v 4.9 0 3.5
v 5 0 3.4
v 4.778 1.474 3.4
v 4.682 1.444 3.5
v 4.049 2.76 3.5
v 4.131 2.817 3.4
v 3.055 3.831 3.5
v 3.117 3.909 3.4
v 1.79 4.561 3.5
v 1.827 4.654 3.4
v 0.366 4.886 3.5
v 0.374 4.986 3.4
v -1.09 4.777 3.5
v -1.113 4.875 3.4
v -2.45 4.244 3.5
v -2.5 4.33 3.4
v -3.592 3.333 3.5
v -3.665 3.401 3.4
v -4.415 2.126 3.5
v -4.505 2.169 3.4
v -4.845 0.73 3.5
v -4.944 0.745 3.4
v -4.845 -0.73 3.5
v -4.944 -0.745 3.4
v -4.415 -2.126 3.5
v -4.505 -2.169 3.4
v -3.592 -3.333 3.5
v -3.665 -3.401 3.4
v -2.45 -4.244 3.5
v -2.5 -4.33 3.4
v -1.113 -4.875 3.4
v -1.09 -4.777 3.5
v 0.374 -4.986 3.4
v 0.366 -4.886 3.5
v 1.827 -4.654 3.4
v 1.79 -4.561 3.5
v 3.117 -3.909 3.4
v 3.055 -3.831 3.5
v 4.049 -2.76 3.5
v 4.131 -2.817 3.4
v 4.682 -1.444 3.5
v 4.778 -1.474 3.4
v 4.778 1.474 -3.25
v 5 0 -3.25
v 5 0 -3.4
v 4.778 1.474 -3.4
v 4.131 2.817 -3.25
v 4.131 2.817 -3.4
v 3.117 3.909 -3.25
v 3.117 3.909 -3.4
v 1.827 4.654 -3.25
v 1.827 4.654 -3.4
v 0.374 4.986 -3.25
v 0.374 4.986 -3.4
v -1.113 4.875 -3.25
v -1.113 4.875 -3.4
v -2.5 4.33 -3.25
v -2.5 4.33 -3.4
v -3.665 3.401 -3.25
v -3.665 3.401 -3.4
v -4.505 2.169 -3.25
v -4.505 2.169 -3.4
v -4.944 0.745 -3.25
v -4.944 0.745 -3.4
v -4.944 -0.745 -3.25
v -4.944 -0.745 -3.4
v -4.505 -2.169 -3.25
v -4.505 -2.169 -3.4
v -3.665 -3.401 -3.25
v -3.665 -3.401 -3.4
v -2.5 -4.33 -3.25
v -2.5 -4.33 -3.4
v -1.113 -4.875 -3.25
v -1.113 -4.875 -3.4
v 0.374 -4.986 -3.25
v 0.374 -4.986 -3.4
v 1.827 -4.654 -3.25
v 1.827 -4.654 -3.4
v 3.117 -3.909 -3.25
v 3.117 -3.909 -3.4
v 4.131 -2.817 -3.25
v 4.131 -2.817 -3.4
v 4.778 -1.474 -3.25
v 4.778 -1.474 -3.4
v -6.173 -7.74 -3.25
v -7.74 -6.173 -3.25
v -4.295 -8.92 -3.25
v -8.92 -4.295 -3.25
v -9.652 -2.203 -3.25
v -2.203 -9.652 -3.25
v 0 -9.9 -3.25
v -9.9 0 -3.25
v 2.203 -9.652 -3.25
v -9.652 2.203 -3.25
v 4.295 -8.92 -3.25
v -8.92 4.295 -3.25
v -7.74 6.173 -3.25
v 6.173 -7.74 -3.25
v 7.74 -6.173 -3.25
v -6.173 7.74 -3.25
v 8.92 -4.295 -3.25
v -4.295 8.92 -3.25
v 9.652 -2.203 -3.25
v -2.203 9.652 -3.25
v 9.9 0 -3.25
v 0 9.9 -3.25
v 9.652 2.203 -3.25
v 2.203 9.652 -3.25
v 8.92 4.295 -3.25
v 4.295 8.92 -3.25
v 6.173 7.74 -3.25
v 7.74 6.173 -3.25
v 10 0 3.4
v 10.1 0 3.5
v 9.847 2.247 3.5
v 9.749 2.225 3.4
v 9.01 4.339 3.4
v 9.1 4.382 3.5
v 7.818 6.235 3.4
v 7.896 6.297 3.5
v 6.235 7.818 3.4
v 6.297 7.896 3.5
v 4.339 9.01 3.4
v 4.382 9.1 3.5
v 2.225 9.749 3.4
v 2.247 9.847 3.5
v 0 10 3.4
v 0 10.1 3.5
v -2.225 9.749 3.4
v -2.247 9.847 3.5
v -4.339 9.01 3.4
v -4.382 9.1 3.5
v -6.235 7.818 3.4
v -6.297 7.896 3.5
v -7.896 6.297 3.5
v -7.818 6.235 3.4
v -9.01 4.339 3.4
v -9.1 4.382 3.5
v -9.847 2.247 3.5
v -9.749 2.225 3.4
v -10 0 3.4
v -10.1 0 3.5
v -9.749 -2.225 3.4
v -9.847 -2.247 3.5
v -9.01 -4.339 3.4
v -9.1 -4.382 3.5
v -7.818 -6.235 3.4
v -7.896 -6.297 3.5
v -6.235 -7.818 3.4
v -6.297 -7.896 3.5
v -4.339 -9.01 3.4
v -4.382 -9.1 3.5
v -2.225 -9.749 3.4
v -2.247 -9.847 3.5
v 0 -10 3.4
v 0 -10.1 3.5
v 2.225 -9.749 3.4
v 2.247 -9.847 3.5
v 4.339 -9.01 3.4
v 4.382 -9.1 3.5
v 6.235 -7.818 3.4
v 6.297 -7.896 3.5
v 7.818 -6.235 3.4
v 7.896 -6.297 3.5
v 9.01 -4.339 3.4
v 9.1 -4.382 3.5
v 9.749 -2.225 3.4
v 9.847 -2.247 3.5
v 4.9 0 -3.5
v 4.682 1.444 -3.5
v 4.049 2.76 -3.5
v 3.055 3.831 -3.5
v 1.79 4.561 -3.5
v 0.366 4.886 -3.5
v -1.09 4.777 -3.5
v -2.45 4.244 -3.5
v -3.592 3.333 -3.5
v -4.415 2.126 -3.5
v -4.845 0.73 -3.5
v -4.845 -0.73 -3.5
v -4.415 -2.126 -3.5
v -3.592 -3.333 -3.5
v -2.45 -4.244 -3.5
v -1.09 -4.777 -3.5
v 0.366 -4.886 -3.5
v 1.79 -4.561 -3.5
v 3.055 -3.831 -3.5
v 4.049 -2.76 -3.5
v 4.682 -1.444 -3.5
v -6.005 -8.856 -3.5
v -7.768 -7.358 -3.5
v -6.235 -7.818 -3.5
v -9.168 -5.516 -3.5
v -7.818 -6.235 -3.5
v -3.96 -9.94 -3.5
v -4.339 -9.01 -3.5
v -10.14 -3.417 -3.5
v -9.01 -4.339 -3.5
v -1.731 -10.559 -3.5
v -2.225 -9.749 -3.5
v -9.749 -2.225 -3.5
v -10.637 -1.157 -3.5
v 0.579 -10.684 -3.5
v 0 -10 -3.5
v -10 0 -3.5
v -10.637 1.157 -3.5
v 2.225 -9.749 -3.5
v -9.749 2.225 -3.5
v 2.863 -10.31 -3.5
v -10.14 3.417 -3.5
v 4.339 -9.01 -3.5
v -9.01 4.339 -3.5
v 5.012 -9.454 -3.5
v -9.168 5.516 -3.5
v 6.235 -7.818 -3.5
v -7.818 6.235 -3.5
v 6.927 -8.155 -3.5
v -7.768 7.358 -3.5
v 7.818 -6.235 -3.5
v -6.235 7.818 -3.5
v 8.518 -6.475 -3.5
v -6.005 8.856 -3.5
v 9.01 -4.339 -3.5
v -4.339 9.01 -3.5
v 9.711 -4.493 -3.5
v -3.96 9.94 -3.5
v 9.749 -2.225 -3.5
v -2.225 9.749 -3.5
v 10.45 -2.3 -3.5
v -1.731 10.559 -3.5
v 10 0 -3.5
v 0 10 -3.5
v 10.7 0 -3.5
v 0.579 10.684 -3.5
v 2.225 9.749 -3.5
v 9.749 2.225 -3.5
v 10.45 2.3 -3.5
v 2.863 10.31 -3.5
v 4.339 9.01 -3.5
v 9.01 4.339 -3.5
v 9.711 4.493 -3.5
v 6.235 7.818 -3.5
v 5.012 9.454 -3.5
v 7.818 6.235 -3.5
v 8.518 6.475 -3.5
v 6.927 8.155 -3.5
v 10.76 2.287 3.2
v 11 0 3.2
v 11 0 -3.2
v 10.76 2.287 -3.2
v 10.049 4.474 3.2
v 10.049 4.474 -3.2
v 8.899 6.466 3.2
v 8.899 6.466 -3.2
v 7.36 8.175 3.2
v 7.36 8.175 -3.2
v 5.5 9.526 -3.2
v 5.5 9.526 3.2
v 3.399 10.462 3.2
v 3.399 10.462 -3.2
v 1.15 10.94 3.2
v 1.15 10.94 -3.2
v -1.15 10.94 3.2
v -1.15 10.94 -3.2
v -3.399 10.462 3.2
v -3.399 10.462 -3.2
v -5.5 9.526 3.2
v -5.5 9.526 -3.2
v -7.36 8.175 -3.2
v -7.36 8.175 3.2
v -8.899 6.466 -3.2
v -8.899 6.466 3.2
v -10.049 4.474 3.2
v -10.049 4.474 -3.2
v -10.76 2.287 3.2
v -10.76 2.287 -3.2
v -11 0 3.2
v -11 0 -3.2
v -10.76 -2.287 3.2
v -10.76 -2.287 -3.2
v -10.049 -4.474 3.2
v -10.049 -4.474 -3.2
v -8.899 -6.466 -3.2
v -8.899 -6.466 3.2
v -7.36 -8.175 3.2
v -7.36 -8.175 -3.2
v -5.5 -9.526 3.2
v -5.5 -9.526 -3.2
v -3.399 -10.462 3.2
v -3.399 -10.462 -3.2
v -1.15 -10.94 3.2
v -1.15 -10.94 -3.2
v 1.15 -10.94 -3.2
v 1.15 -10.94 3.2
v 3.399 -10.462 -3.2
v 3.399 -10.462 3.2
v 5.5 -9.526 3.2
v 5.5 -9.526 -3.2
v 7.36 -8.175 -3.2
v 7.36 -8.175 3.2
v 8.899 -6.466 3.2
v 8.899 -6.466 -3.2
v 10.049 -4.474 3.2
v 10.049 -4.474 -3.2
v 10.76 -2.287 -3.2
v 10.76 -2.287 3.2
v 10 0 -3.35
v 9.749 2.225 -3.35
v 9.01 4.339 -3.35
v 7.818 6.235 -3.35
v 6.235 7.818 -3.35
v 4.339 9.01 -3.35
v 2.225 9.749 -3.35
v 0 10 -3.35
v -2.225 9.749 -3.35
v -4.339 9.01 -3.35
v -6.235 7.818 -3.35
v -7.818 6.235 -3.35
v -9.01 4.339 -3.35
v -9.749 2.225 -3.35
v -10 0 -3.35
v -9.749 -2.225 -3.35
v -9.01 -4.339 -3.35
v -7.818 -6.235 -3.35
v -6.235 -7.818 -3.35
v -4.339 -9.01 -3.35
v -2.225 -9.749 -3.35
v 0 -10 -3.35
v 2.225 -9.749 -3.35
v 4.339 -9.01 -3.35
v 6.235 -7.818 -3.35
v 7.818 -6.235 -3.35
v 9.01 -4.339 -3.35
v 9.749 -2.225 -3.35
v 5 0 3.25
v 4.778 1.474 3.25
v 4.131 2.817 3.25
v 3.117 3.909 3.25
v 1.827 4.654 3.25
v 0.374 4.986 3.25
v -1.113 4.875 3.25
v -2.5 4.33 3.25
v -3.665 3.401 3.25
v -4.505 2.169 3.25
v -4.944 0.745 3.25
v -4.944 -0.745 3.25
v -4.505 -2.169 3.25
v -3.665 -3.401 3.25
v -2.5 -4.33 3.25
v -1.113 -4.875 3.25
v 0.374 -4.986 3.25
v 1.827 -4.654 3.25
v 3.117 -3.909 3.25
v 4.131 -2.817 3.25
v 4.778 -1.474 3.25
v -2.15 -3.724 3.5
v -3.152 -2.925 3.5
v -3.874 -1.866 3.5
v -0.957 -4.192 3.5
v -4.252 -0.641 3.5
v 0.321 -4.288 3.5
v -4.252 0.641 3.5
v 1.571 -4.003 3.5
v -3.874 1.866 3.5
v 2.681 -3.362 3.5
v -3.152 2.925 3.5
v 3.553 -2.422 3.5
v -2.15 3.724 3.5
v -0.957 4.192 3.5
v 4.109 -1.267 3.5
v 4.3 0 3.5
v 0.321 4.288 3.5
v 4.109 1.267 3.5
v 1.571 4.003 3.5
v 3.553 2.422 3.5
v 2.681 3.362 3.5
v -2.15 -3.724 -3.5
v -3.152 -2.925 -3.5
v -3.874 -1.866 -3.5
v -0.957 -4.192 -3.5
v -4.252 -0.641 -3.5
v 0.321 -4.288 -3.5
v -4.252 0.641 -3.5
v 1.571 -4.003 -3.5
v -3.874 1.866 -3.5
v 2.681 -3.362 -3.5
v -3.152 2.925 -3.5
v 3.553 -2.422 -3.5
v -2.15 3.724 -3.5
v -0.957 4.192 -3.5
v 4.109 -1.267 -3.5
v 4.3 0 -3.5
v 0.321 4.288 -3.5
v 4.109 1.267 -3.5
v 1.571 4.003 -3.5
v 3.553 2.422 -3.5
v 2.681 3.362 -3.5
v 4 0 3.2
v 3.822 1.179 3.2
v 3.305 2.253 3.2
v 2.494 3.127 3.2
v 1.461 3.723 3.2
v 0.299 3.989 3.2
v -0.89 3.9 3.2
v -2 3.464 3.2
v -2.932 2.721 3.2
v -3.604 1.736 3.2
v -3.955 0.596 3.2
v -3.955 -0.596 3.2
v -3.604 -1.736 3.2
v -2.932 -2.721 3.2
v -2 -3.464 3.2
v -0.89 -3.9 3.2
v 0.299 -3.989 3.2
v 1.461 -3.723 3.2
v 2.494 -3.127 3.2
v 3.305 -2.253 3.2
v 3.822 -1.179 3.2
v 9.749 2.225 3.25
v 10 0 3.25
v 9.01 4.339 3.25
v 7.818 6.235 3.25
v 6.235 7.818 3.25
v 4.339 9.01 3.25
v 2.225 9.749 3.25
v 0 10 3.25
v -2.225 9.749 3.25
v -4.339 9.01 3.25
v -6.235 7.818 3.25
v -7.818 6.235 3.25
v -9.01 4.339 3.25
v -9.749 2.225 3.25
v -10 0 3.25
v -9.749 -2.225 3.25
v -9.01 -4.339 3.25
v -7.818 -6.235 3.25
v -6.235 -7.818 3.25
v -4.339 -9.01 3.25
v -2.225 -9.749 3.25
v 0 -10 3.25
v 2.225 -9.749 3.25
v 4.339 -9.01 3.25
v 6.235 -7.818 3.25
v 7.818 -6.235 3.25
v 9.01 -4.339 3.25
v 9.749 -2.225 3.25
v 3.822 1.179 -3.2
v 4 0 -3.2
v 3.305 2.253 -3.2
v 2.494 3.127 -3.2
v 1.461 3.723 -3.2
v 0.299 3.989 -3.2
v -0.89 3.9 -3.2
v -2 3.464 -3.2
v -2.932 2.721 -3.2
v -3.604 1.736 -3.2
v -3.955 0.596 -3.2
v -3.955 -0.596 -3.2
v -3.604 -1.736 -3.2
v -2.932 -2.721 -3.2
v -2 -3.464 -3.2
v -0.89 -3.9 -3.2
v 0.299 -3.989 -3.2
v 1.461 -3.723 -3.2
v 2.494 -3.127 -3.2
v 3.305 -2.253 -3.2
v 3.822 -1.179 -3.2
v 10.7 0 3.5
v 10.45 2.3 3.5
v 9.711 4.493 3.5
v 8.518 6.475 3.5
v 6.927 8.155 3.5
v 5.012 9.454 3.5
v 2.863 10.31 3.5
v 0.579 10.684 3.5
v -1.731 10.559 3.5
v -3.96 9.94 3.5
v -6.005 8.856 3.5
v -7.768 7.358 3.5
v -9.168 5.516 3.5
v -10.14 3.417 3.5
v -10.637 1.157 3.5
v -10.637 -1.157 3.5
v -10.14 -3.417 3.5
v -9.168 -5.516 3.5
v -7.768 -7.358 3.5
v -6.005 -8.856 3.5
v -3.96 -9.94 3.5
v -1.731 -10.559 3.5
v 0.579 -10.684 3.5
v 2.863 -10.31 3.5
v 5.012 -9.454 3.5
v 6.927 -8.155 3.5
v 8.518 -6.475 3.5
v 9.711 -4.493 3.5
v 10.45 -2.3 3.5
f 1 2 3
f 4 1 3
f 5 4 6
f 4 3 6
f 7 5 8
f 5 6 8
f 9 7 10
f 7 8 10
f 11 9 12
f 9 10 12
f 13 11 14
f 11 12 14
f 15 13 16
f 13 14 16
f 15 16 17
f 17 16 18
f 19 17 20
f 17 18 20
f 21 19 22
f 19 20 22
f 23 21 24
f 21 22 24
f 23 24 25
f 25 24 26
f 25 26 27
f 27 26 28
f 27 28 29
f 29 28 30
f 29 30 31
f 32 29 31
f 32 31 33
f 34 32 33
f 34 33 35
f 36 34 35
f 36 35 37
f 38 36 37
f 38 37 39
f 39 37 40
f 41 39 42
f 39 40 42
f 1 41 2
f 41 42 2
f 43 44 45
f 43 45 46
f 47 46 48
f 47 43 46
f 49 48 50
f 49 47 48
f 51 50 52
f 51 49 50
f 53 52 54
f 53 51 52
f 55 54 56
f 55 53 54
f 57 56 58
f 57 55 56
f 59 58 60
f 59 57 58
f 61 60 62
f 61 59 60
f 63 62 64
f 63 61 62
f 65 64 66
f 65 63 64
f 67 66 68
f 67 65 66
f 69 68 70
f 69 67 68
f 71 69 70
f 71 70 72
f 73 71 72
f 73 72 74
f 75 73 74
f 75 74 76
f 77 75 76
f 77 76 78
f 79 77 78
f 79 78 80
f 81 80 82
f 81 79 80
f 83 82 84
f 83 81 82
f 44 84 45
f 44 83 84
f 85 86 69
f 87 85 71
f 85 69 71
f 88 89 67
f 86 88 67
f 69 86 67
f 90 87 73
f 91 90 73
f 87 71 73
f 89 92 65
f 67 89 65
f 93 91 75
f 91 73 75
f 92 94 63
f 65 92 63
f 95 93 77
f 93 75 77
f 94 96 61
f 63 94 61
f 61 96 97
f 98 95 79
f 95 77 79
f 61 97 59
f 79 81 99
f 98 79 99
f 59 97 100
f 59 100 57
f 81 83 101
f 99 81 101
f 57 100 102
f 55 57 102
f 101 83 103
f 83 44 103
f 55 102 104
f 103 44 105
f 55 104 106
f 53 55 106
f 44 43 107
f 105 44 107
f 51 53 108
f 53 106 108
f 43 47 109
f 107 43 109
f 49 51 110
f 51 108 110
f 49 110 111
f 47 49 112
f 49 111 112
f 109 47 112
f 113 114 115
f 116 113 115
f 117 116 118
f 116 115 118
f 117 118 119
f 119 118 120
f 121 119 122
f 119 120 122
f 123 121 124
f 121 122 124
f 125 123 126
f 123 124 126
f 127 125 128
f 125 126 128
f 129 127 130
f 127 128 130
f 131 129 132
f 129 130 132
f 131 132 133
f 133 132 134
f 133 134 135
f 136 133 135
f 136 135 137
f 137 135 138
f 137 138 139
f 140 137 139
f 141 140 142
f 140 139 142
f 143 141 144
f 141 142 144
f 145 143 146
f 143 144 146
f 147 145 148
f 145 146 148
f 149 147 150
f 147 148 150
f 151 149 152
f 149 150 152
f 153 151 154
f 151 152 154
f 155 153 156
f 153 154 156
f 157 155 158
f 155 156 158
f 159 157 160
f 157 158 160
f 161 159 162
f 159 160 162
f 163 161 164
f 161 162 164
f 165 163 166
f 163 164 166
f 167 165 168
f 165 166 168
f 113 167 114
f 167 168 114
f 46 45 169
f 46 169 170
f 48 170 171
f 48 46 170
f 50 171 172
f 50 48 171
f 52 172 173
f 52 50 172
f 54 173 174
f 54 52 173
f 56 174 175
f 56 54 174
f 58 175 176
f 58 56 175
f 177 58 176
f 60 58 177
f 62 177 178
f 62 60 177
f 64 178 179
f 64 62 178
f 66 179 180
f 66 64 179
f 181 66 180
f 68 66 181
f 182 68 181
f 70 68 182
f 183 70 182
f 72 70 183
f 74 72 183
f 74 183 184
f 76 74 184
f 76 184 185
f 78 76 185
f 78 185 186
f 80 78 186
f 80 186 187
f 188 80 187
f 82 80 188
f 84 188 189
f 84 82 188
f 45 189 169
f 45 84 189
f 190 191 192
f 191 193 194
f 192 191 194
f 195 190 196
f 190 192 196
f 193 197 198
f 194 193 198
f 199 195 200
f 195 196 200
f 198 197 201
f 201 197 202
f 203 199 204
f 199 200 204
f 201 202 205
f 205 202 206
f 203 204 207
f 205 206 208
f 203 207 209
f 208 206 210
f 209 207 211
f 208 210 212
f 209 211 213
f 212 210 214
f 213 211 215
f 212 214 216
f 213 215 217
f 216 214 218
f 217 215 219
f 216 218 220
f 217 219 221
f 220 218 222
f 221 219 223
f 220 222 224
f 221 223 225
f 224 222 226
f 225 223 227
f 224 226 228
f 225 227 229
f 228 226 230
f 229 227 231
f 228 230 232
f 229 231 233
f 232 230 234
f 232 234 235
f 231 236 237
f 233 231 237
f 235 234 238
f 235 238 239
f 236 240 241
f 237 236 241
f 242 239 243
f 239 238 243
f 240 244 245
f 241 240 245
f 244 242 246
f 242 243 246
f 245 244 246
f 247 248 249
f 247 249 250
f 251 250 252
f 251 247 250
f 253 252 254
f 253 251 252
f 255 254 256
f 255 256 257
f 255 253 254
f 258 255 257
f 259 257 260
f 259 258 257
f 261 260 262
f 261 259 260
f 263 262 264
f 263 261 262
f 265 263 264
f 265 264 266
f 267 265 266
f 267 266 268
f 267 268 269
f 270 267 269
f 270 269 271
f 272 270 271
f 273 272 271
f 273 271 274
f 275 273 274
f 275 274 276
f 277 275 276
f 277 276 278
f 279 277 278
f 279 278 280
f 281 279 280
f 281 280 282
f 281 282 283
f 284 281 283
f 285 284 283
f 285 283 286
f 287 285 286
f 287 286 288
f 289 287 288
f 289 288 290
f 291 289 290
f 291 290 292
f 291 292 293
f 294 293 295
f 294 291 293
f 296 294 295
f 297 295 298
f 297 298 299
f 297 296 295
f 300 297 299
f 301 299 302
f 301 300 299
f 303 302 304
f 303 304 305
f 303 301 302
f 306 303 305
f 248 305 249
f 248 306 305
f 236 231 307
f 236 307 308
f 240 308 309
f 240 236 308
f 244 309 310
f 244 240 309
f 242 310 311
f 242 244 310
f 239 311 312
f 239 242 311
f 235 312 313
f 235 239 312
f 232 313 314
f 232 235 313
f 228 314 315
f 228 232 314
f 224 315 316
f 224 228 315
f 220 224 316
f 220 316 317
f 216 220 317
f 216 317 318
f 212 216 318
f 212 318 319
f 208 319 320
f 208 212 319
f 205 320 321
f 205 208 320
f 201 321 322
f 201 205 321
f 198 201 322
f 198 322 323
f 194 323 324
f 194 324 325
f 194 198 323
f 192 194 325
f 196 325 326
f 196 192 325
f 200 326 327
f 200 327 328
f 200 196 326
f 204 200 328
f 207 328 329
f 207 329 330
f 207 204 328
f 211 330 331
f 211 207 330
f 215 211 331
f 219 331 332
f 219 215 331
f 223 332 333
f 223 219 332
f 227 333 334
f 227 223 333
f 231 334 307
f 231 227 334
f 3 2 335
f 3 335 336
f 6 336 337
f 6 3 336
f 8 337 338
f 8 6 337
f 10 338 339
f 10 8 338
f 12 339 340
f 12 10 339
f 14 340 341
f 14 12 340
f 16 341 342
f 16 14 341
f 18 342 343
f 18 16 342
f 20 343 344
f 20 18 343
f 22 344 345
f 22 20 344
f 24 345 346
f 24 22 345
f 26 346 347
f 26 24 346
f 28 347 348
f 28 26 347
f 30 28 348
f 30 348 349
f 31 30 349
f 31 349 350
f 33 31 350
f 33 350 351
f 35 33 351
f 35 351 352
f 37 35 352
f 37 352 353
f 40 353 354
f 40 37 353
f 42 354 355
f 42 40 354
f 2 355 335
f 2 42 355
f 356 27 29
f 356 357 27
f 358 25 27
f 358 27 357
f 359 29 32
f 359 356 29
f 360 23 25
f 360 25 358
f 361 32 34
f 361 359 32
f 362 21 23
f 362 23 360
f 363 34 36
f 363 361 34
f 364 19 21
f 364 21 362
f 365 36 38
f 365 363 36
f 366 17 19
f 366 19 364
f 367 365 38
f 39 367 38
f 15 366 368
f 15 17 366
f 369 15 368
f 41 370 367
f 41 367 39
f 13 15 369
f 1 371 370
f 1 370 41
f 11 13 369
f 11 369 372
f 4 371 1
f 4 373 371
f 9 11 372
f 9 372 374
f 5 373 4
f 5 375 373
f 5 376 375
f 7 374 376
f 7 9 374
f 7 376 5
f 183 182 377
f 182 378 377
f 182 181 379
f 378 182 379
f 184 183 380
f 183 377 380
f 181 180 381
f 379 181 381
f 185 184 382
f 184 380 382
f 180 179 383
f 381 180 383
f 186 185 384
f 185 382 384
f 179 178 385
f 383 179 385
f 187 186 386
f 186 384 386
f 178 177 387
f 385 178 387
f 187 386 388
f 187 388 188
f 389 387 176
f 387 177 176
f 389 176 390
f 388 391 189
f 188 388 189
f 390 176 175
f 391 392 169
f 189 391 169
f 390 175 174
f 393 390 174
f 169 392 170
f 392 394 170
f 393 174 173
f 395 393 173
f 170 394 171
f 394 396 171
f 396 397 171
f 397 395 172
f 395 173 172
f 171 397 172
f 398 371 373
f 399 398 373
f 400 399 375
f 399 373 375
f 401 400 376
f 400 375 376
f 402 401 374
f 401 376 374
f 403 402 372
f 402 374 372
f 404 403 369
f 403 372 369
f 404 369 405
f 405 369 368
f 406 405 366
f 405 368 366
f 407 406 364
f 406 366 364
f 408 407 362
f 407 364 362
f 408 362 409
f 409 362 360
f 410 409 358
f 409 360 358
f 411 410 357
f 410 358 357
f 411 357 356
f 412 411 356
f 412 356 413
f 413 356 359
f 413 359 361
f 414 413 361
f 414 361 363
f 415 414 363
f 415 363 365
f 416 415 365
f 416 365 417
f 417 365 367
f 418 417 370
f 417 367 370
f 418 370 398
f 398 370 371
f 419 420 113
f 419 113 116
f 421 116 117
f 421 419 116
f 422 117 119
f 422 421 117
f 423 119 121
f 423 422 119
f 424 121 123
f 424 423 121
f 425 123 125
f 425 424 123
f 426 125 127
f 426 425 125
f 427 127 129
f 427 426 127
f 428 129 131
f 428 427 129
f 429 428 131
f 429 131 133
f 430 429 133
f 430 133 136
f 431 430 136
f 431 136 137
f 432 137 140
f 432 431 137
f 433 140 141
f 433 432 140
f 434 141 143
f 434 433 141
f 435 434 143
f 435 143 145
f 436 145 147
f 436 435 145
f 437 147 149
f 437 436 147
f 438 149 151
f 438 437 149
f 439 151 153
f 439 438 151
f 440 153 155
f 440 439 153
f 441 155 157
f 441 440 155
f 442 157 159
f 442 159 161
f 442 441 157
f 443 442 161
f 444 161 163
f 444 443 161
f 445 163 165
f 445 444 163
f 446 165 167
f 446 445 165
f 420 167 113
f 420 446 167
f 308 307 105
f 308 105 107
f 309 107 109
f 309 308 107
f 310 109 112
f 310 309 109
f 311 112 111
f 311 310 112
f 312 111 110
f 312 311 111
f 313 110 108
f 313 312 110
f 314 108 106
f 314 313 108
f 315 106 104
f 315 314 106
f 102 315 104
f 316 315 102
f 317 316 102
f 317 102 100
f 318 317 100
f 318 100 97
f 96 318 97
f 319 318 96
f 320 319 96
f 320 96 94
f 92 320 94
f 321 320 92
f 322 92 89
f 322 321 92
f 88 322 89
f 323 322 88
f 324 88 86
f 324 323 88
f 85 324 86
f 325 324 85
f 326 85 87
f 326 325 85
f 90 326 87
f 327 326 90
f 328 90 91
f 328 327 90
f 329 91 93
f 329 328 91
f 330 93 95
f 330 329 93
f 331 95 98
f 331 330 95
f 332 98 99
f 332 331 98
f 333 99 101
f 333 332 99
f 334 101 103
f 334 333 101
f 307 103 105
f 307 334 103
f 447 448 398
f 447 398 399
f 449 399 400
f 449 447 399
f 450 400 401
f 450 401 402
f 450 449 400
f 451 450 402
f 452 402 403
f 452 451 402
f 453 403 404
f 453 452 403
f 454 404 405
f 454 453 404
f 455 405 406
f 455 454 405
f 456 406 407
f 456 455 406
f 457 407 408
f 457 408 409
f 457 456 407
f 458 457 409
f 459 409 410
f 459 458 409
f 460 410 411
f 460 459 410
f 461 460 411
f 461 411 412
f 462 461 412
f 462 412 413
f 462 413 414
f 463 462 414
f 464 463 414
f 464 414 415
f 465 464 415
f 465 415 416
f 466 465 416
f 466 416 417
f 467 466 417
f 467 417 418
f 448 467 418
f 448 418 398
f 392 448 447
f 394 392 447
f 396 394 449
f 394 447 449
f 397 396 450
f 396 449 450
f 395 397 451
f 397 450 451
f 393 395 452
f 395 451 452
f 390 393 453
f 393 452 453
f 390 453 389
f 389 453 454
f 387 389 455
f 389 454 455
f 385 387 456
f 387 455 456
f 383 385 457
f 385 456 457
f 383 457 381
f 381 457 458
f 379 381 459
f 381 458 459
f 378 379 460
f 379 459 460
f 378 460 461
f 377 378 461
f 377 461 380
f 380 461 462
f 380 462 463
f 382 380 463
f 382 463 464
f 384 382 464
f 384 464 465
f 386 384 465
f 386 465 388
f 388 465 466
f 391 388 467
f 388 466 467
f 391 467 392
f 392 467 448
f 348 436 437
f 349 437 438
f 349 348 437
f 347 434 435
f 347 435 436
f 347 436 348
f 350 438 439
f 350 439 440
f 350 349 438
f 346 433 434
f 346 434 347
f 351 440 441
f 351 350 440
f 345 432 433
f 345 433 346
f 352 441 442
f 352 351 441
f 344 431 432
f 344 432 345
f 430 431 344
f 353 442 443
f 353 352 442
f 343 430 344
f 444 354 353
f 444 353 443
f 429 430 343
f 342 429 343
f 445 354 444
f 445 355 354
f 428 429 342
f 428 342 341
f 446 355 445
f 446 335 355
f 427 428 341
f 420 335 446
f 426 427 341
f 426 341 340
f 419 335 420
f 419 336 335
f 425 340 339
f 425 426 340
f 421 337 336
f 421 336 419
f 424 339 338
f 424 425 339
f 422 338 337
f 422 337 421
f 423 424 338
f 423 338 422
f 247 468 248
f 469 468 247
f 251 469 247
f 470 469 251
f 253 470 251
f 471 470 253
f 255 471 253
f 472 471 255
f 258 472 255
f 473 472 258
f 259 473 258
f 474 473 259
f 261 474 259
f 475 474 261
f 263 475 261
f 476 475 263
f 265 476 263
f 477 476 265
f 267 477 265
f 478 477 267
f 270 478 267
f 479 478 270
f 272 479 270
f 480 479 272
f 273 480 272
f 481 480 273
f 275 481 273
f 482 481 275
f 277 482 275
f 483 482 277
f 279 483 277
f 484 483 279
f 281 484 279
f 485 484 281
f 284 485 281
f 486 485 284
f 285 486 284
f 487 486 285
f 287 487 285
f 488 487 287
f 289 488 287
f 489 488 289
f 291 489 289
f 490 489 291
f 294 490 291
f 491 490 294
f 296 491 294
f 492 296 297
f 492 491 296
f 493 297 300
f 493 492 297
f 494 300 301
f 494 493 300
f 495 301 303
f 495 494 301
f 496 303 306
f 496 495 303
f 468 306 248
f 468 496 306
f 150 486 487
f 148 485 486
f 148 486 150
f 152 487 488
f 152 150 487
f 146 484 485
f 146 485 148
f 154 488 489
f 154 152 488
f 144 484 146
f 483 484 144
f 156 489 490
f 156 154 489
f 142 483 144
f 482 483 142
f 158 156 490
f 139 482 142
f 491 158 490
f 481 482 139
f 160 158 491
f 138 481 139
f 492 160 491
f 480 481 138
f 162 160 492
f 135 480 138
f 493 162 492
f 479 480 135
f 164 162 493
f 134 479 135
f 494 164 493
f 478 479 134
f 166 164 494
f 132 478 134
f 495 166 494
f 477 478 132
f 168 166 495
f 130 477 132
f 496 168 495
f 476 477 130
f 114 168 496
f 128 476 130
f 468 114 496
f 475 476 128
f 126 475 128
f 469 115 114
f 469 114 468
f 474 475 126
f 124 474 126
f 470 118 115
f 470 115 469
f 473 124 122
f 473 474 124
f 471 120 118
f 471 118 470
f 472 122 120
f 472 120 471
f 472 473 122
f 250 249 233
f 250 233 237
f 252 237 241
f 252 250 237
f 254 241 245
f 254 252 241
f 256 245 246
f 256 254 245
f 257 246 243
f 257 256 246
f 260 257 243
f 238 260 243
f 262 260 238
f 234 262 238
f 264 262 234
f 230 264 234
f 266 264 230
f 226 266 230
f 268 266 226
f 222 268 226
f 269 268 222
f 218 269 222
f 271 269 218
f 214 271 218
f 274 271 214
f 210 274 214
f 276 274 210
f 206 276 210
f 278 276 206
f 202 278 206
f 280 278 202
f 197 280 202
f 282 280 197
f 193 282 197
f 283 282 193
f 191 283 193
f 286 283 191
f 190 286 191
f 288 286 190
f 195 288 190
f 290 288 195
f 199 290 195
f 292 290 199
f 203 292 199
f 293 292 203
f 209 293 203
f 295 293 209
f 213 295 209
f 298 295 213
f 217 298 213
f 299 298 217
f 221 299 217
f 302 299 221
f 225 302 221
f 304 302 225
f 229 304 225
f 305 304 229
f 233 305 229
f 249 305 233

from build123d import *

# Parameters (mm, degrees)
SKETCH1_R             = 11
SKETCH1_R_2           = 10
BOSS_EXTRUDE1_DEPTH   = 3.5
SKETCH1_R_3           = 5
SKETCH1_R_4           = 4
BOSS_EXTRUDE1_2_DEPTH = 3.5
SKETCH1_3_R           = 10
SKETCH1_3_R_2         = 5
BOSS_EXTRUDE2_DEPTH   = 3.25
CHAMFER1_SIZE         = 0.3
CHAMFER2_SIZE         = 0.1


with BuildPart() as part:
    # Sketch1 → Boss-Extrude1 (new body, symmetric)
    with BuildSketch(Plane.XY):
        Circle(SKETCH1_R)
        Circle(SKETCH1_R_2, mode=Mode.SUBTRACT)
    extrude(amount=BOSS_EXTRUDE1_DEPTH, both=True)



with BuildPart() as body_2:
    # Sketch1 → Boss-Extrude1 2 (new body, symmetric)
    with BuildSketch(Plane.XY):
        Circle(SKETCH1_R_3)
        Circle(SKETCH1_R_4, mode=Mode.SUBTRACT)
    extrude(amount=BOSS_EXTRUDE1_2_DEPTH, both=True)


with BuildPart() as part_1:
    add(part.part)

    add(body_2.part)  # Boss-Extrude2 merges body 2
    # Sketch1_3 → Boss-Extrude2 (add, symmetric)
    with BuildSketch(Plane.XY):
        Circle(SKETCH1_3_R)
        Circle(SKETCH1_3_R_2, mode=Mode.SUBTRACT)
    extrude(amount=BOSS_EXTRUDE2_DEPTH, both=True)

    # Chamfer1
    chamfer1_edges = [part_1.edges().sort_by_distance(p)[0] for p in [
        (-11, 0, 3.5),
        (-4, 0, 3.5),
        (-4, 0, -3.5),
        (-11, 0, -3.5),
    ]]
    chamfer(chamfer1_edges, length=CHAMFER1_SIZE)

    # Chamfer2
    chamfer2_edges = [part_1.edges().sort_by_distance(p)[0] for p in [
        (-10, 0, -3.25),
        (-5, 0, -3.5),
        (-5, 0, 3.5),
        (-10, 0, 3.5),
    ]]
    chamfer(chamfer2_edges, length=CHAMFER2_SIZE)


solid = part_1.part
